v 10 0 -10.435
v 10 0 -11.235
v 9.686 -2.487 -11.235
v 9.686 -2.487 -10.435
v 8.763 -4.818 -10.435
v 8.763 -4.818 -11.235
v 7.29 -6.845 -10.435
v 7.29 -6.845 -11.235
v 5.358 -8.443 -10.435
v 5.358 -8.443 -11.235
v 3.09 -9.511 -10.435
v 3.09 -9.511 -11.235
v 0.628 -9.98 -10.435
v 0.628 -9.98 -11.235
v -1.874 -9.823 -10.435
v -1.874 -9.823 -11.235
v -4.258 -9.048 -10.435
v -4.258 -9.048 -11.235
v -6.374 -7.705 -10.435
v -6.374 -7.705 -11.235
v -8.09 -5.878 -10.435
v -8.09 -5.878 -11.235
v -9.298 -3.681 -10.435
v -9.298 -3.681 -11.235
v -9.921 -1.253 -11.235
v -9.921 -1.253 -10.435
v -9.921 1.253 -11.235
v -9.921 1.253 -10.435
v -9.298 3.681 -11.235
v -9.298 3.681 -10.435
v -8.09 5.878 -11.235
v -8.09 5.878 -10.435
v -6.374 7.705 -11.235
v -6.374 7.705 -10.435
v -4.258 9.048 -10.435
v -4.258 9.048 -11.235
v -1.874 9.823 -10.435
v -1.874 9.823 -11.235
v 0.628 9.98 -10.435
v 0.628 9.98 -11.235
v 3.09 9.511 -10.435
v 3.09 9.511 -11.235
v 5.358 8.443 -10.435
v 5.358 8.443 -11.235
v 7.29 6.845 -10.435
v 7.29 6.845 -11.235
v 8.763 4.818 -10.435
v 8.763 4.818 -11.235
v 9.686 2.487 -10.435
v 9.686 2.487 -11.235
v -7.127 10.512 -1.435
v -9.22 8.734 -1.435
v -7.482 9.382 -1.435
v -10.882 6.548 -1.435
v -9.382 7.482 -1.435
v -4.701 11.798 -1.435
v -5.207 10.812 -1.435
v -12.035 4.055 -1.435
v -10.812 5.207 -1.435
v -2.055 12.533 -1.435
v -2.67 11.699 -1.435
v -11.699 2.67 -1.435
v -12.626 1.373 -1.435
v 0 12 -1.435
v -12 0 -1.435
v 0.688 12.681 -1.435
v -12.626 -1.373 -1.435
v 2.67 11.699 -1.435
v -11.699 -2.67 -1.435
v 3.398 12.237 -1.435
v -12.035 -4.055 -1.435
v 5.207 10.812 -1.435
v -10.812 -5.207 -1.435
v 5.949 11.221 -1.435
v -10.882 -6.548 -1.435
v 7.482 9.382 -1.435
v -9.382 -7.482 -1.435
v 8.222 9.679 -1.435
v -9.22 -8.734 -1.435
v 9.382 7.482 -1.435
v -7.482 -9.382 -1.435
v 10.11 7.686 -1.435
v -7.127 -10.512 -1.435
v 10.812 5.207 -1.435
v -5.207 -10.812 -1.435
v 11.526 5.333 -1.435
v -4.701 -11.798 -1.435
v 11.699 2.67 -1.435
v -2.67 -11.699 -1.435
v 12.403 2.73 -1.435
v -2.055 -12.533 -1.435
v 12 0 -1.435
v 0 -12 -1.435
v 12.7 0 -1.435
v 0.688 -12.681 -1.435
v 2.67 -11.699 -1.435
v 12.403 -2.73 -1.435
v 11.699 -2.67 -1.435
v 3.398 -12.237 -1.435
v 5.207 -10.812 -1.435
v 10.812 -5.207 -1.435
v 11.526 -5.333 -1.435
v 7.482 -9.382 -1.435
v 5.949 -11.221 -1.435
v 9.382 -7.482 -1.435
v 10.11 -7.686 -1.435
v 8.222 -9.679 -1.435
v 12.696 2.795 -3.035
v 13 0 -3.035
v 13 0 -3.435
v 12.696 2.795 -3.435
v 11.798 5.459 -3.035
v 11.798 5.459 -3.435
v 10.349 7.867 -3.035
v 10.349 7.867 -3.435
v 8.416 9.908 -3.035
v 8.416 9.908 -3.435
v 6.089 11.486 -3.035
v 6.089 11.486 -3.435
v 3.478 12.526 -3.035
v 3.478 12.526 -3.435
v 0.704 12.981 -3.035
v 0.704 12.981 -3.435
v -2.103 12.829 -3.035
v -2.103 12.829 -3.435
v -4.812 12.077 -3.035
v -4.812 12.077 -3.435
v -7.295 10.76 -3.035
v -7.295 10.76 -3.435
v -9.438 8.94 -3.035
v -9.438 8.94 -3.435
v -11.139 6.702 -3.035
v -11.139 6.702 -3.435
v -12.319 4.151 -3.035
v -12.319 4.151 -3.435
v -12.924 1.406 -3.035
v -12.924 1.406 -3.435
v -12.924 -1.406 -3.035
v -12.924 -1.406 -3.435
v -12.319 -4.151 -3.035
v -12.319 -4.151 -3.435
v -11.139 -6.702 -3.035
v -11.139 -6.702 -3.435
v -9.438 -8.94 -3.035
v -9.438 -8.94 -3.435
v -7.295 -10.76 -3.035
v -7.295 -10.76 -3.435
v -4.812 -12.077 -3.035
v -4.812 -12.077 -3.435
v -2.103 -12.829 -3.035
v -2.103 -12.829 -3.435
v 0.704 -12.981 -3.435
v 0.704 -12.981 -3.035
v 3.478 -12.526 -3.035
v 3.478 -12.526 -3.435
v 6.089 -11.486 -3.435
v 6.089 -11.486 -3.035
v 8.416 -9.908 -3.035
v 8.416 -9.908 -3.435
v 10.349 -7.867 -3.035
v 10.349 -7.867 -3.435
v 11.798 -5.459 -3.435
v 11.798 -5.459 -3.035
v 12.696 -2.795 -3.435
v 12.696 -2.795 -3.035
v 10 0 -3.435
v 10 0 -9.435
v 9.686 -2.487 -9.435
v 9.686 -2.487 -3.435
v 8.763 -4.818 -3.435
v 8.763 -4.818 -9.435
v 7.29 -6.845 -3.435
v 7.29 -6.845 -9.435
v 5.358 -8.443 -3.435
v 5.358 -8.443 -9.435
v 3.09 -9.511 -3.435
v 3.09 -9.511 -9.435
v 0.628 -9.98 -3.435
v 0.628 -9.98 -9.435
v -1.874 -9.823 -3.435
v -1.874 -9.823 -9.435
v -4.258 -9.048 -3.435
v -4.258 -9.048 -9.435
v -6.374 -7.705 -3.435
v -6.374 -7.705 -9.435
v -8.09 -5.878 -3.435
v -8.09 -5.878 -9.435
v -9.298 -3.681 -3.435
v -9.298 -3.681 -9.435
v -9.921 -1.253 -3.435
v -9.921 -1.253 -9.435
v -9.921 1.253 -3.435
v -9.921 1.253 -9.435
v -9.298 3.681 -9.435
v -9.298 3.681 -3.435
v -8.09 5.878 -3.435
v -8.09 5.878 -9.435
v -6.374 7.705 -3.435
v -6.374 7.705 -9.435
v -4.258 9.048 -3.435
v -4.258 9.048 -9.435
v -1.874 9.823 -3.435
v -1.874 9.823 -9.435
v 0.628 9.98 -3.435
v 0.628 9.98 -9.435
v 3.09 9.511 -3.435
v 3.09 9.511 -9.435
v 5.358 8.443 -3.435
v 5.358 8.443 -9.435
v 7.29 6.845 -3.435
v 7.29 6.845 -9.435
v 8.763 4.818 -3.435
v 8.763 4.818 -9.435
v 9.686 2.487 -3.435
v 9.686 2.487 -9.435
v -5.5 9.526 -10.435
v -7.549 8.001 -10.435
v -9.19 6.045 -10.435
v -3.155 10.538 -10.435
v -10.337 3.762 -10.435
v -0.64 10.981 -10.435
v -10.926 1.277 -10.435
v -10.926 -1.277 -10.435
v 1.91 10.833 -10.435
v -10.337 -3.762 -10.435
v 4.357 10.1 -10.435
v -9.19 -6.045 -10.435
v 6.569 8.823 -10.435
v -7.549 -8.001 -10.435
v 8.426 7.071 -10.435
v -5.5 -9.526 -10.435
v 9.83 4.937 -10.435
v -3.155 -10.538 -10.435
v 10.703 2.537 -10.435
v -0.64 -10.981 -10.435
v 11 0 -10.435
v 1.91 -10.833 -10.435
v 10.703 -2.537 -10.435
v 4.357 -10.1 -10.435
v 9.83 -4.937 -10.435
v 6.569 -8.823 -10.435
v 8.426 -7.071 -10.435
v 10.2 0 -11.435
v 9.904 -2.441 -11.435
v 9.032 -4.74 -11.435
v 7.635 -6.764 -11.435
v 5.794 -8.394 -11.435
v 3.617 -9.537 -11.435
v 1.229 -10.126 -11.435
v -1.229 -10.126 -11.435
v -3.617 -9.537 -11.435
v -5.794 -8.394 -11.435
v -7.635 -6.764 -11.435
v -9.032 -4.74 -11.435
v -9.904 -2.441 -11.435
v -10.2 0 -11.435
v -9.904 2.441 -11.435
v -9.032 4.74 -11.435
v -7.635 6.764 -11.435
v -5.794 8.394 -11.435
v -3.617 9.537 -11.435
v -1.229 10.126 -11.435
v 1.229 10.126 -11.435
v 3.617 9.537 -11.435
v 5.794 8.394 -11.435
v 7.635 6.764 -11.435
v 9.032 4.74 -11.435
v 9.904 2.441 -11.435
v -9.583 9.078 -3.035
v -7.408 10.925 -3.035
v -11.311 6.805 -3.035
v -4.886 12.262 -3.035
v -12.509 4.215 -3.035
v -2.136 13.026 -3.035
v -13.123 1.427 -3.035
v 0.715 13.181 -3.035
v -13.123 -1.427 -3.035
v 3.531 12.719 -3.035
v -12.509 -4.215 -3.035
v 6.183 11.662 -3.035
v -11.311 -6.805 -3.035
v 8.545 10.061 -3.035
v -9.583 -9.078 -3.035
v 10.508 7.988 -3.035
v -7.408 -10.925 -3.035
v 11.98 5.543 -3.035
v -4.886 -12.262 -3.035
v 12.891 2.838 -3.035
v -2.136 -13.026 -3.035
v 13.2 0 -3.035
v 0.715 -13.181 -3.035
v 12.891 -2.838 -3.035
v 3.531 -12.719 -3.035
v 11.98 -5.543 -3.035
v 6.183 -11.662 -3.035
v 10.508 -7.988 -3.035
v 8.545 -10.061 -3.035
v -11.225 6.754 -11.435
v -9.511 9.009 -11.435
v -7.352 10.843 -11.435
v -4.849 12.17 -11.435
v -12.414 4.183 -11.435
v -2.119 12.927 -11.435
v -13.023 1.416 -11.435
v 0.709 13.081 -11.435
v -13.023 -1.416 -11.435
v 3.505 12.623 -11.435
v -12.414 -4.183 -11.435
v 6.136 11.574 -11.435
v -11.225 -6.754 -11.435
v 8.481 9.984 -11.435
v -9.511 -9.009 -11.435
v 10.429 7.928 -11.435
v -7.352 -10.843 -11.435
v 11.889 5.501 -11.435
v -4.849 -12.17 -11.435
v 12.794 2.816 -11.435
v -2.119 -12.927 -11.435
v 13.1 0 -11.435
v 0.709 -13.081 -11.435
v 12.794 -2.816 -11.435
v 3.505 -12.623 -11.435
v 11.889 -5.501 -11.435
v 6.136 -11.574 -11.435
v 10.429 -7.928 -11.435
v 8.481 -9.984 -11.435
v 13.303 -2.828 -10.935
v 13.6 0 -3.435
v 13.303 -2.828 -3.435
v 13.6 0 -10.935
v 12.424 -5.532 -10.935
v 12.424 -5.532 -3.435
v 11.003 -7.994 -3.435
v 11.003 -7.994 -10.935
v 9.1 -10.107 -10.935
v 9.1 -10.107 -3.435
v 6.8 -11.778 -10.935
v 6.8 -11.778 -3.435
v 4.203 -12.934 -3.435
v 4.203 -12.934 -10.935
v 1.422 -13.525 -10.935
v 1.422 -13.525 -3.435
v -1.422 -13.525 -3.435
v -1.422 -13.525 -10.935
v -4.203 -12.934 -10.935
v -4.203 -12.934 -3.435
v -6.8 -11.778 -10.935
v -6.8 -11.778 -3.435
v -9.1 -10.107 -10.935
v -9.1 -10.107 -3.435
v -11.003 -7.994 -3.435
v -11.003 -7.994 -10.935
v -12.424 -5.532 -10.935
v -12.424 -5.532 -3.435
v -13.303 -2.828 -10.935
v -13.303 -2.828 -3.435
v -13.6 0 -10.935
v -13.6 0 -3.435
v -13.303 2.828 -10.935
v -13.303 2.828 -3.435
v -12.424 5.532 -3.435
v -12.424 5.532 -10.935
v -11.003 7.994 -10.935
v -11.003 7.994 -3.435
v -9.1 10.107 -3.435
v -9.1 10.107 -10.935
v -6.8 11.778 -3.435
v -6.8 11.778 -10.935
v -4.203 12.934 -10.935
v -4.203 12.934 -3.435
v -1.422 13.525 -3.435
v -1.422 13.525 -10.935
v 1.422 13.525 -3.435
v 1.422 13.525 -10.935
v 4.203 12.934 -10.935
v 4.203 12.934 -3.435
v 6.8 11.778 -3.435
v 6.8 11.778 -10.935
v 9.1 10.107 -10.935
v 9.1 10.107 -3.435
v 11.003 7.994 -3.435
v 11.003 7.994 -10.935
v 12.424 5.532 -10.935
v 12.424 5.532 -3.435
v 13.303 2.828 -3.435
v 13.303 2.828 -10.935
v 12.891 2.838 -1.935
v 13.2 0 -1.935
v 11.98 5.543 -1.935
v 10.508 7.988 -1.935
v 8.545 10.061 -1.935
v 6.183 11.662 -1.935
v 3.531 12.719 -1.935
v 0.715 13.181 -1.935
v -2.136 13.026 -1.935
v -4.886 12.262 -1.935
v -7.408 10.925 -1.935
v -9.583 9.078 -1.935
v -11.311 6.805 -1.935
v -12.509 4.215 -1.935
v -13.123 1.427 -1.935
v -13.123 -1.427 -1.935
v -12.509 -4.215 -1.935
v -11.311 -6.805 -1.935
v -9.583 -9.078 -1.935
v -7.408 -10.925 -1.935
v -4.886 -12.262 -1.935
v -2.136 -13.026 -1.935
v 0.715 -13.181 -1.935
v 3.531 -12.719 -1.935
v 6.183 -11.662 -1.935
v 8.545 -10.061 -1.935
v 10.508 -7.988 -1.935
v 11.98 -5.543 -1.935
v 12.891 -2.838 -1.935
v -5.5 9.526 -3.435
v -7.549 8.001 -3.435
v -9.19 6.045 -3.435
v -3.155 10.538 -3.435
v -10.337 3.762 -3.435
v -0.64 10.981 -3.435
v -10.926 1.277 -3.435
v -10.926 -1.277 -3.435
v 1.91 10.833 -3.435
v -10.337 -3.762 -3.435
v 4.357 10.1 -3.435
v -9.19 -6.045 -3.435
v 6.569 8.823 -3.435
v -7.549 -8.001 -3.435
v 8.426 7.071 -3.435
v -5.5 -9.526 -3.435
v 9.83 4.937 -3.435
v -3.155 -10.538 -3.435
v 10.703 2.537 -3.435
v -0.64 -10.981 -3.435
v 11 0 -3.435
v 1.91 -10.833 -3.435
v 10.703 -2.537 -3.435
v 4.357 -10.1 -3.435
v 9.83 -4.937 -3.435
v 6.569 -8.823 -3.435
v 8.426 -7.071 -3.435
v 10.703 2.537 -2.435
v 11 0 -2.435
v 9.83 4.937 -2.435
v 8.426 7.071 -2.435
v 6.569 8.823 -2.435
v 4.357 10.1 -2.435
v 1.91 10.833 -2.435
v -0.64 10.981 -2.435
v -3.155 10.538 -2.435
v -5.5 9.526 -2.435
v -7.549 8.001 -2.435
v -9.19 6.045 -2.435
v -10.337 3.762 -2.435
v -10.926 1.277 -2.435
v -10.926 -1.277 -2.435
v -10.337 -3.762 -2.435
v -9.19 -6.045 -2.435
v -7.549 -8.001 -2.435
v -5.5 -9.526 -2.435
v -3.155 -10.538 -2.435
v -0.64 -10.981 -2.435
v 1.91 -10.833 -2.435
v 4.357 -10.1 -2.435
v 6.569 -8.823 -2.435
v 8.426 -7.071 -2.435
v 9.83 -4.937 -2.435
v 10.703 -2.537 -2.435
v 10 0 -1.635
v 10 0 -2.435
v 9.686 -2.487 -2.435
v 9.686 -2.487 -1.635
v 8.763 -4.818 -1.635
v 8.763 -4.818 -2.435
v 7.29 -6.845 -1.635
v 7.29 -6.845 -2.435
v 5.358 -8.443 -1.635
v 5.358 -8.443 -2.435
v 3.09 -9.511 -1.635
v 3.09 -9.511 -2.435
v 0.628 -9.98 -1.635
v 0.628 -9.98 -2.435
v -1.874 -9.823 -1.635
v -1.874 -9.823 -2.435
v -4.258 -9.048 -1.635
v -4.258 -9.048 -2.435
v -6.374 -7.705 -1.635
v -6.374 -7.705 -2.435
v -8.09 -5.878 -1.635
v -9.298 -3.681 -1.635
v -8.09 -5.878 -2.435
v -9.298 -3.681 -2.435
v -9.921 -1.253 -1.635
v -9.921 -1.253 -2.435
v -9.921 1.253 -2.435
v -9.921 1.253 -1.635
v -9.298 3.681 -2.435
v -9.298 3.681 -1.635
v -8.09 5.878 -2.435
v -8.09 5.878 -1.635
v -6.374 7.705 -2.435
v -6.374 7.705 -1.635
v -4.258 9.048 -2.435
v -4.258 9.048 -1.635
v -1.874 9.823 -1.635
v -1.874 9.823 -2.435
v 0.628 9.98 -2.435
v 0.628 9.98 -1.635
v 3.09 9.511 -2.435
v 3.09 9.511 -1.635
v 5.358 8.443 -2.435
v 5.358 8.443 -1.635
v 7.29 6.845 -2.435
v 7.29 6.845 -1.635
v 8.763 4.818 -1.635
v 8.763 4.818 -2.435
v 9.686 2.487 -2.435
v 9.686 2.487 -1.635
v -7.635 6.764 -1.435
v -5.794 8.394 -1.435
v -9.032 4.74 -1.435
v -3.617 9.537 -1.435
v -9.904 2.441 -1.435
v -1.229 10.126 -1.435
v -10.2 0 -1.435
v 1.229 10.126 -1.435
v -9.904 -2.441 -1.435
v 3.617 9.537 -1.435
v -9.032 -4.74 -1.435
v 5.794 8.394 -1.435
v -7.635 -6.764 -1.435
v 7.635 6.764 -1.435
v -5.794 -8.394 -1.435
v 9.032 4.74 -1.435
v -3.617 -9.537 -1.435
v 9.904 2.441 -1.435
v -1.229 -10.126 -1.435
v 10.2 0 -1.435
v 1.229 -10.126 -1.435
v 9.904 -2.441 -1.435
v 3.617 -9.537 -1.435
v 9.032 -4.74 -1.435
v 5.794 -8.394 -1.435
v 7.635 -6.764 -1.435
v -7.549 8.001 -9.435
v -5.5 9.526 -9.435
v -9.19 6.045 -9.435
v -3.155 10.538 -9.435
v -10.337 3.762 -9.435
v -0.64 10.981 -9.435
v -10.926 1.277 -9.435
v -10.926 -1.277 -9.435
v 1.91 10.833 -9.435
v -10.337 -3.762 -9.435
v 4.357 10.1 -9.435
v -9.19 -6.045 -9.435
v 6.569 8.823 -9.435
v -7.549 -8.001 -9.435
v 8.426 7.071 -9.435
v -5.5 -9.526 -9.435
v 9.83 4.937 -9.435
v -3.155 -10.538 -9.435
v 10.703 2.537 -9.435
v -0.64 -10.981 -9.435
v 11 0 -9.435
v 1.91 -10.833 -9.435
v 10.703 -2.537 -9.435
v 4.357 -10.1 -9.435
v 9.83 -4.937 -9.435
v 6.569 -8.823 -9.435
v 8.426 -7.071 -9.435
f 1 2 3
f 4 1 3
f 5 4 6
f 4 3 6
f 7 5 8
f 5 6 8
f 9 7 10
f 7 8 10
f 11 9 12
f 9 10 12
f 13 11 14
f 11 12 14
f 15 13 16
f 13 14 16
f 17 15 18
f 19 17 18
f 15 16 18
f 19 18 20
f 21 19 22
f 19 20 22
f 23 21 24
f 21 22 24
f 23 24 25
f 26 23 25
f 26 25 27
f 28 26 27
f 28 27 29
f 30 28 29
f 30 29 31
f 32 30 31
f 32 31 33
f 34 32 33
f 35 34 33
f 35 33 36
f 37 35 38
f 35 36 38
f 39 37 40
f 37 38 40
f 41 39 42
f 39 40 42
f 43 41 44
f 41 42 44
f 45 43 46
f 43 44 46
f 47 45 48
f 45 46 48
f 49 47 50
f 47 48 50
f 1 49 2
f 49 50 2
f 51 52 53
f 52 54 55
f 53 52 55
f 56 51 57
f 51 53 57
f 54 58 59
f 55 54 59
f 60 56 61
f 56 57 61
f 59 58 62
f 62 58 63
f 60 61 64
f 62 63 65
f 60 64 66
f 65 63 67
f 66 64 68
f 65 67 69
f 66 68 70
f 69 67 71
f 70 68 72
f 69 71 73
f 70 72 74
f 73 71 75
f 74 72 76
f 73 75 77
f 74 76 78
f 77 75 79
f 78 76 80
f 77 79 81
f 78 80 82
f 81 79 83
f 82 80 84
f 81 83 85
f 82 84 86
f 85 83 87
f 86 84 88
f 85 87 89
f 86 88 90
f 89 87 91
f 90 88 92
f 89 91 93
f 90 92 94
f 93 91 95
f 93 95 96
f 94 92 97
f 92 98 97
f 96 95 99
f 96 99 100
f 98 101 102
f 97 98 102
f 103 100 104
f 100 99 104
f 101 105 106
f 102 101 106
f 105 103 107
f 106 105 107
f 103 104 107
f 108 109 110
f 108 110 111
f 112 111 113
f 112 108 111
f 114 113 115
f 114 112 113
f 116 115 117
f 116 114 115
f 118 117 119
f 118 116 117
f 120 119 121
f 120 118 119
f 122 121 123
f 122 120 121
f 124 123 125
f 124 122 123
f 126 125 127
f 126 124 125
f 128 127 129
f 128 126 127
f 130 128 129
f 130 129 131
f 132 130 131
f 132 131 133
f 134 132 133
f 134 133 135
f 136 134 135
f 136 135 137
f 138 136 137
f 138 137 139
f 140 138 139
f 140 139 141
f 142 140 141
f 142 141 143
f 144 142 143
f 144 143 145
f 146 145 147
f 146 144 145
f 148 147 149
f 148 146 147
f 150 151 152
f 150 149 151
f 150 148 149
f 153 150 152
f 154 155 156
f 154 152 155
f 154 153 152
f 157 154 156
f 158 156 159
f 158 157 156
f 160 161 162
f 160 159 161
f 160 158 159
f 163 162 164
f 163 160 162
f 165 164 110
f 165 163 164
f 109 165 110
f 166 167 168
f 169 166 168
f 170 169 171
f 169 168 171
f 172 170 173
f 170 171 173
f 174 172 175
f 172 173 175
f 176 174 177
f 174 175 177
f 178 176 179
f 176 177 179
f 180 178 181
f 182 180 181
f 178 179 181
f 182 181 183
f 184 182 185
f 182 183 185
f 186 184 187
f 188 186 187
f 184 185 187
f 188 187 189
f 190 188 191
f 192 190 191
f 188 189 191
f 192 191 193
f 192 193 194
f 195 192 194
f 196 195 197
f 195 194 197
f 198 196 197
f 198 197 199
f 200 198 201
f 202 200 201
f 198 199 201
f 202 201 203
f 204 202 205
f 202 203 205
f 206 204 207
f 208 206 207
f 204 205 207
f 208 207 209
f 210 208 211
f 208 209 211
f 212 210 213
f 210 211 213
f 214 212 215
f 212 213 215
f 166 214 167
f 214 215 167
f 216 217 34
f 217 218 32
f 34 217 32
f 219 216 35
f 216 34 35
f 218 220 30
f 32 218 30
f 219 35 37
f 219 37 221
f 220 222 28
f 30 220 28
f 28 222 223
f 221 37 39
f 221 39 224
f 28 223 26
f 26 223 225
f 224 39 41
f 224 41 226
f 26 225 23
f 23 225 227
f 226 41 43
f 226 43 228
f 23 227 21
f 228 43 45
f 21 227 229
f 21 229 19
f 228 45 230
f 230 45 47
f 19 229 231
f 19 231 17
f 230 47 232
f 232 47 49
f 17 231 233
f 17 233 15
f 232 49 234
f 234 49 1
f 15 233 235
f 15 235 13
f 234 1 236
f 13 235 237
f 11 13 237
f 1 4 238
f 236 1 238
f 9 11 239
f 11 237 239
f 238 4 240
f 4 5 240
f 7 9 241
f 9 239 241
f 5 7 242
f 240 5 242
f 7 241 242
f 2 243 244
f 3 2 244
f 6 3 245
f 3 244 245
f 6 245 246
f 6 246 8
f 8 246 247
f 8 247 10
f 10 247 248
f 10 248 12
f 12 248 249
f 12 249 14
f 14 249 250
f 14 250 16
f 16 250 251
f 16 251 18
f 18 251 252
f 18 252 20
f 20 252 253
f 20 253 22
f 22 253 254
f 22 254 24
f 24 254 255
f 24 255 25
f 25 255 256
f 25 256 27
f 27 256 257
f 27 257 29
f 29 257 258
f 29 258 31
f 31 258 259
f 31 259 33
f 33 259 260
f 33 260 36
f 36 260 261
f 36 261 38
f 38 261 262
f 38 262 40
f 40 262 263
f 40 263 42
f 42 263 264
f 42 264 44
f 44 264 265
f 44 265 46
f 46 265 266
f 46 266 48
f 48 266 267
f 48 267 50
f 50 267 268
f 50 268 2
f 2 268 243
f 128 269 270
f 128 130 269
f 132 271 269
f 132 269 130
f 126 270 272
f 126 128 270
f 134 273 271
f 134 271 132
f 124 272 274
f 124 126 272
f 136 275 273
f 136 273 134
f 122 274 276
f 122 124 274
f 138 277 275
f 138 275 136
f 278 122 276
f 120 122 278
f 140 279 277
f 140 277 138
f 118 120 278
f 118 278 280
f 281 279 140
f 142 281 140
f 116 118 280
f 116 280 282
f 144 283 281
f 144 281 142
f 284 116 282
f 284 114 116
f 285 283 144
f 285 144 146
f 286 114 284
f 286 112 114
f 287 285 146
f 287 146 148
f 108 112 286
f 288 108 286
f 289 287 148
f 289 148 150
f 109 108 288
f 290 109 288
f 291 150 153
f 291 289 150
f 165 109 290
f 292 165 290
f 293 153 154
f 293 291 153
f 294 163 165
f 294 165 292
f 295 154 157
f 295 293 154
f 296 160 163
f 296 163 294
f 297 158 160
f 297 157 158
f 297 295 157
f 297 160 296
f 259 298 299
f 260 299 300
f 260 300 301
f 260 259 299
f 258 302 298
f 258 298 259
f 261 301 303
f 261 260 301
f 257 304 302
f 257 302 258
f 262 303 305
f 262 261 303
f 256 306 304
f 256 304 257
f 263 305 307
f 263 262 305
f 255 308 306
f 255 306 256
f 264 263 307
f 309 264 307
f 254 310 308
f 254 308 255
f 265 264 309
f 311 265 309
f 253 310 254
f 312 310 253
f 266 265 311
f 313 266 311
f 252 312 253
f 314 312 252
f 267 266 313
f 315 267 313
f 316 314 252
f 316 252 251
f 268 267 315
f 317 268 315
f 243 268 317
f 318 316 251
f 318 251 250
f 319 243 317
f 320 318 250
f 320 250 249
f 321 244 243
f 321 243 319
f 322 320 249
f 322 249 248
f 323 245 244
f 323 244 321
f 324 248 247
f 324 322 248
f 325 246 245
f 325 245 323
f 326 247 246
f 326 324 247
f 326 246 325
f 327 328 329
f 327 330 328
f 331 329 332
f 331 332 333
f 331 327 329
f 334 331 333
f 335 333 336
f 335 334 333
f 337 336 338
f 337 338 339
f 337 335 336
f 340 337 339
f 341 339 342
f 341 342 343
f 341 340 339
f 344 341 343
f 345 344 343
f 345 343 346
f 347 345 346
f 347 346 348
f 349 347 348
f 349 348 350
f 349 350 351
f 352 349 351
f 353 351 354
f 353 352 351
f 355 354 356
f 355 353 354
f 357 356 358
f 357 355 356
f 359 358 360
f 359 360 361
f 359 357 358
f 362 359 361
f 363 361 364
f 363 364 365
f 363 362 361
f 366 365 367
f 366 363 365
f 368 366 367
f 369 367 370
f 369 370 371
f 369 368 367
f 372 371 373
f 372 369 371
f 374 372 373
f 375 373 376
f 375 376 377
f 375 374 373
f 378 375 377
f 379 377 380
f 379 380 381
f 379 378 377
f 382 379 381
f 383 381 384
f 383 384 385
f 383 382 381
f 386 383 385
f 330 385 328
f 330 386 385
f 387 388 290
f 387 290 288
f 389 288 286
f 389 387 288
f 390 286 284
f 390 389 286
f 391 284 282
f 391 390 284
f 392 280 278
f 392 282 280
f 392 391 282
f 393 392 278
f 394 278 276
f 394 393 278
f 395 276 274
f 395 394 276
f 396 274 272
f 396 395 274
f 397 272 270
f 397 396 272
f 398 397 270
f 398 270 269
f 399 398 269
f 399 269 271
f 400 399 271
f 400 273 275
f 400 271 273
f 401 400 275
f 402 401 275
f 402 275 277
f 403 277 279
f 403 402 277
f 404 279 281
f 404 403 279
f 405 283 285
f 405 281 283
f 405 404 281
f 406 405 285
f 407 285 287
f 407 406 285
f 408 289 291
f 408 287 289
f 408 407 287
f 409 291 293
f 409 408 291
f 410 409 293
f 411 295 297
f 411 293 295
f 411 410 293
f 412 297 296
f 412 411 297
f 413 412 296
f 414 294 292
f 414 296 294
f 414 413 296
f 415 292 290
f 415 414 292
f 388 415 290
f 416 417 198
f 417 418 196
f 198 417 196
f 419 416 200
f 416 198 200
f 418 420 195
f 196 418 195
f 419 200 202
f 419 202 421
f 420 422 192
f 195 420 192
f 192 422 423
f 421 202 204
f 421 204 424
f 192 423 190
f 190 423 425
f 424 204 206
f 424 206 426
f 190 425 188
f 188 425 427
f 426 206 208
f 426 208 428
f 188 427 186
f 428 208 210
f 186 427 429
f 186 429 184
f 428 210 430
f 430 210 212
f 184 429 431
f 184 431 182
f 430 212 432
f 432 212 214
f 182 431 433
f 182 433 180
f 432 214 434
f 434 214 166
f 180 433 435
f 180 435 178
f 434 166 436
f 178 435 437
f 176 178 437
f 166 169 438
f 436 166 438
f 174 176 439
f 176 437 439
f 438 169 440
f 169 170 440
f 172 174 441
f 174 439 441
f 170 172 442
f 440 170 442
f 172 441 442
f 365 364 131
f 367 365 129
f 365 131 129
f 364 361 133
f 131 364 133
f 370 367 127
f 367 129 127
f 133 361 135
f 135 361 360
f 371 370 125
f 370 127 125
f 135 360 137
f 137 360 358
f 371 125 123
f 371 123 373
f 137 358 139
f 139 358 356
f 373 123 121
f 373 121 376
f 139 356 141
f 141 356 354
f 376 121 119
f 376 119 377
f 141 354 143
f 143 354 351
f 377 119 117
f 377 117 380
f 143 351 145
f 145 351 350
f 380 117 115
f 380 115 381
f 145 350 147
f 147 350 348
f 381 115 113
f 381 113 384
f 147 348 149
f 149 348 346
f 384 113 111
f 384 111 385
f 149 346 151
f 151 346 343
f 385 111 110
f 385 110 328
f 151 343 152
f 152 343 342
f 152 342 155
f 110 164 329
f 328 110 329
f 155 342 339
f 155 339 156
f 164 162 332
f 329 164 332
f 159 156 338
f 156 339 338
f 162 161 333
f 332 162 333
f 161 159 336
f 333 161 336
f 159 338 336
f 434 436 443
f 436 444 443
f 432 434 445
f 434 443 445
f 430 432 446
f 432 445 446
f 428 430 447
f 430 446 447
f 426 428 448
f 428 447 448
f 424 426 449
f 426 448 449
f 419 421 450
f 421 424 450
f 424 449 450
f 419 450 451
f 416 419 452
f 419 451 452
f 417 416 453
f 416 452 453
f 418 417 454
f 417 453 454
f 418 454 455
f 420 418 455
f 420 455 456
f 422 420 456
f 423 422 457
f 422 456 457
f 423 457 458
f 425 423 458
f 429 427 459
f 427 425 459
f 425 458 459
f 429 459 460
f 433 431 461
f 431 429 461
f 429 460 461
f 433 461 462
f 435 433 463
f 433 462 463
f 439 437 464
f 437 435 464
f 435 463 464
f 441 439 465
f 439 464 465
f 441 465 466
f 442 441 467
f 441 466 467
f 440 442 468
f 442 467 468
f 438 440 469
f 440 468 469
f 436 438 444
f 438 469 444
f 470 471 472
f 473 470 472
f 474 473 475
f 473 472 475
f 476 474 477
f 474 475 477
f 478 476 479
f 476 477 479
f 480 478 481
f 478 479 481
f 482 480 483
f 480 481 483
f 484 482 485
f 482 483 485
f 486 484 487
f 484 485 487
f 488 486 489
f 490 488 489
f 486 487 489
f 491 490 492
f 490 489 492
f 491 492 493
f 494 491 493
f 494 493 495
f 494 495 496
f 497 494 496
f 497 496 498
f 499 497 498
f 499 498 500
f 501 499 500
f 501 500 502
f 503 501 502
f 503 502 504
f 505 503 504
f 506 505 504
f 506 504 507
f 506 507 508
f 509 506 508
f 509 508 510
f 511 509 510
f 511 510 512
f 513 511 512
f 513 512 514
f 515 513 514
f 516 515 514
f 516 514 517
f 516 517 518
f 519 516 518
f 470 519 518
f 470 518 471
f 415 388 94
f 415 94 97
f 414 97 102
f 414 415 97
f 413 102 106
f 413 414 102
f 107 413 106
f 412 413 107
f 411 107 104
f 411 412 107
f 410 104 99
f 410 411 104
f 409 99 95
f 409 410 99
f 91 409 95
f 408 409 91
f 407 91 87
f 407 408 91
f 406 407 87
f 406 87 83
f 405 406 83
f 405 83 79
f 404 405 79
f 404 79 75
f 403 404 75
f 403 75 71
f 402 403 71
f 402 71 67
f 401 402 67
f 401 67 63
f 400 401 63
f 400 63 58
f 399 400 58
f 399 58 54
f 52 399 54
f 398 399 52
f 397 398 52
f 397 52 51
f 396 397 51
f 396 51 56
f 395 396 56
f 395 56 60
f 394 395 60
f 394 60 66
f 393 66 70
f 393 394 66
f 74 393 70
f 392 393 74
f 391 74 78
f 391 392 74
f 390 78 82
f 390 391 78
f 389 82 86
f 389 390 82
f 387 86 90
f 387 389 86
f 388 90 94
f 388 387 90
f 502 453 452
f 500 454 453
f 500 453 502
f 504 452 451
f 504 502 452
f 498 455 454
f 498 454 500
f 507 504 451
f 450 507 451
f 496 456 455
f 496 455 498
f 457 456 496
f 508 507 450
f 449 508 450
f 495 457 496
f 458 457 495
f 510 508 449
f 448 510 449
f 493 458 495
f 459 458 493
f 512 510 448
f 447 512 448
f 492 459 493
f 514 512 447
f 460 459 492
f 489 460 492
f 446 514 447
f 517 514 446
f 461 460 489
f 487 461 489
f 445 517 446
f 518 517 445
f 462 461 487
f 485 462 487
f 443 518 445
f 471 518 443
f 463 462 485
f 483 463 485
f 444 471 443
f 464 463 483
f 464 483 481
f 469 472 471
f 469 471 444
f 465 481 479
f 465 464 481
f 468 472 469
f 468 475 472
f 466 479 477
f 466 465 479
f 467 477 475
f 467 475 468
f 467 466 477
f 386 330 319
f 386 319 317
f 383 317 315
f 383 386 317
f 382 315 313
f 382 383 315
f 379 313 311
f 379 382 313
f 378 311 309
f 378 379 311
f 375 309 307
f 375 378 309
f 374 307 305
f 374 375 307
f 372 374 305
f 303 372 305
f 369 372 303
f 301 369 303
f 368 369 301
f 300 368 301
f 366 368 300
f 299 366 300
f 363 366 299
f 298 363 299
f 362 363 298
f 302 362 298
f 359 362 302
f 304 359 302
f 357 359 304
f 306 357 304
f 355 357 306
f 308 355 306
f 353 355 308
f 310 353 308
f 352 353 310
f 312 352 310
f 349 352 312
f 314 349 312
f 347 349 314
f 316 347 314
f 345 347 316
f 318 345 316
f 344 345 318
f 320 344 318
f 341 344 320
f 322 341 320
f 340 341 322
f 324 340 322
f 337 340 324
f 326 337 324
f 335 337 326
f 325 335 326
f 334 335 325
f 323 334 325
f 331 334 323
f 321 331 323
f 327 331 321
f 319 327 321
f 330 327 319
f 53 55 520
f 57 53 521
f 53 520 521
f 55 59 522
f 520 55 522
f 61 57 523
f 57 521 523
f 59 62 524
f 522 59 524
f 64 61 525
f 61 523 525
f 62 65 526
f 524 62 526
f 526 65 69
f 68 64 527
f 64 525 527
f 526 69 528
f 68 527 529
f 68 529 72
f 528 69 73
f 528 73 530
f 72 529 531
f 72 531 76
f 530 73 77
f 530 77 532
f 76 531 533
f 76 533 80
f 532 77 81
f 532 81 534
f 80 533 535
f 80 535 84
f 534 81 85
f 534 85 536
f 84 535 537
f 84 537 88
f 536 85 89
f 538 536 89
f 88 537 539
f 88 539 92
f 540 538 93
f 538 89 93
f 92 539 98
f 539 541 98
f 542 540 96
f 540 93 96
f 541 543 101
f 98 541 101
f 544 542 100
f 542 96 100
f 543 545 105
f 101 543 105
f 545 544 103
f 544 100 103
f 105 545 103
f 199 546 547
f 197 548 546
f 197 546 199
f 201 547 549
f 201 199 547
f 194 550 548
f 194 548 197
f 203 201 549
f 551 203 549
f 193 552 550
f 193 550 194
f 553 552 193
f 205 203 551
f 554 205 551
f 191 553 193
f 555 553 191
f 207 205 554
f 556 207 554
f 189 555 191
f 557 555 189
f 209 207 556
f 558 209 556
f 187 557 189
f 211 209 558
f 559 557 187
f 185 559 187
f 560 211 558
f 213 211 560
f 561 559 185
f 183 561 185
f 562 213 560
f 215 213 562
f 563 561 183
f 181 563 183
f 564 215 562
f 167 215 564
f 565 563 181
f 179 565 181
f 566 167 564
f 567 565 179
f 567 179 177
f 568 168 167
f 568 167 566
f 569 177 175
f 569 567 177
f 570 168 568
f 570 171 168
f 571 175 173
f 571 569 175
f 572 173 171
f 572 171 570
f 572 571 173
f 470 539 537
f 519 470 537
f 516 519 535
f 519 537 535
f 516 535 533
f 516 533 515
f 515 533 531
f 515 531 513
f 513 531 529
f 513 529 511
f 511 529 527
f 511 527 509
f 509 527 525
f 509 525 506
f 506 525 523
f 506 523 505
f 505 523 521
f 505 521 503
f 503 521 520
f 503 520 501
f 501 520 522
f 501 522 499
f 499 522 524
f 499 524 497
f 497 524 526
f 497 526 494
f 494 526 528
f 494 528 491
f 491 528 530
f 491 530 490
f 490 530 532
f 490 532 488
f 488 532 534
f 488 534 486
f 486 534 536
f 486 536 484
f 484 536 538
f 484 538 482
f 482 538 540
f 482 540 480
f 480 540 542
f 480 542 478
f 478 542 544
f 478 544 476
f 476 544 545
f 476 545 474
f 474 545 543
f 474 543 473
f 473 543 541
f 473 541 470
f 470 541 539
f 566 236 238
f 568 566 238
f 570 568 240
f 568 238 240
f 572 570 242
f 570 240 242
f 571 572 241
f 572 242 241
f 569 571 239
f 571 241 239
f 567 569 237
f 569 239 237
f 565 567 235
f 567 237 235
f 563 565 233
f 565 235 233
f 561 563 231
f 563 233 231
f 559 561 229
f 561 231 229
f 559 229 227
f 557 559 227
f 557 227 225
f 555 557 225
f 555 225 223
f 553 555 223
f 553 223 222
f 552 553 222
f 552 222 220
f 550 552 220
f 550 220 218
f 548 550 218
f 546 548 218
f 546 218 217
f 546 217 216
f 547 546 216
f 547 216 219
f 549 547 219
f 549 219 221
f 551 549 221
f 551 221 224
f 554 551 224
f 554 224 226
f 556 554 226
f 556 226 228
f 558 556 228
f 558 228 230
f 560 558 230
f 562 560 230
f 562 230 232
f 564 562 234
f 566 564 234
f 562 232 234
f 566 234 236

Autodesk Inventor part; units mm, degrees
ref_plane "YZ Plane" through (0, 0, 0) normal (1, 0, 0) x (0, 1, 0)
ref_plane "XZ Plane" through (0, 0, 0) normal (0, 1, 0) x (-1, 0, 0)
ref_plane "XY Plane" through (0, 0, 0) normal (0, 0, 1) x (1, 0, 0)
sketch "Sketch4" plane through (0, 0, 0) normal (0, 1, 0) x (-1, 0, 0)
  line L0 (-13.6, -3.4347) -> (-13.6, -11.4347)
  line L1 (-11, -9.4347) -> (-10, -9.4347)
  line L2 (-11, -3.4347) -> (-10, -3.4347)
  line L3 (-10, -3.4347) -> (-10, -9.4347)
  line L4 (0, 0) -> (0, -21.3586) construction
  line L5 (-10, -11.4347) -> (-13.6, -11.4347)
  line L6 (-10, -1.4347) -> (-12, -1.4347)
  line L7 (-11, -9.4347) -> (-11, -10.4347)
  line L8 (-11, -10.4347) -> (-10, -10.4347)
  line L9 (-11, -3.4347) -> (-11, -2.4347)
  line L10 (-11, -2.4347) -> (-10, -2.4347)
  line L11 (-10, -1.4347) -> (-10, -2.4347)
  line L12 (-10, -10.4347) -> (-10, -11.4347)
  line L13 (-13.2, -1.4347) -> (-12, -1.4347)
  line L14 (-13.2, -3.0347) -> (-13.2, -1.4347)
  line L15 (-13.6, -3.4347) -> (-13, -3.4347)
  line L16 (-13, -3.4347) -> (-13, -3.0347)
  line L17 (-13, -3.0347) -> (-13.2, -3.0347)
  point P0 (-10, -10.9347)
  point P1 (-11, -9.9347)
  dimension "d23" = 8
  dimension "d28" = 6
  dimension "d29" = 10
  dimension "d37" = 1
  dimension "d38" = 1
  dimension "d39" = 10
  dimension "d40" = 11
  dimension "d41" = 11
  dimension "d42" = 1
  dimension "d43" = 10
  dimension "d44" = 2
  dimension "d63" = 0.6
  dimension "d64" = 13.6
  dimension "d65" = 13.2
revolve "Revolution1" add sketch "Sketch4" angle 360 about axis through (0, 0, 0) along (0, 0, -1)
chamfer "Chamfer1" distance 0.5 angle 45 1 edges at (-13.2, 0, -1.4347)
sketch "Sketch5" plane through (0, 0, -3.4347) normal (0, 0, 1) x (1, 0, 0)
  circle A0 centre (0, 0) radius 13.6 projected
  point P0 (13.6, 0)
  point P1 (-13.6, 0)
ref_plane "Work Plane1" through (13.6, 0, -3.4347) normal (1, 0, 0) x (0, 1, 0)
ref_plane "Work Plane2" through (-13.6, 0, -3.4347) normal (-1, 0, 0) x (0, -1, 0)
chamfer "Chamfer2" distance 0.5 angle 45 1 edges at (-13.6, 0, -11.4347)
chamfer "Chamfer3" distance 0.2 angle 45 1 edges at (-10, 0, -1.4347)
chamfer "Chamfer4" distance 0.2 angle 45 1 edges at (-10, 0, -11.4347)
properties part number "tuleja łożyska"
